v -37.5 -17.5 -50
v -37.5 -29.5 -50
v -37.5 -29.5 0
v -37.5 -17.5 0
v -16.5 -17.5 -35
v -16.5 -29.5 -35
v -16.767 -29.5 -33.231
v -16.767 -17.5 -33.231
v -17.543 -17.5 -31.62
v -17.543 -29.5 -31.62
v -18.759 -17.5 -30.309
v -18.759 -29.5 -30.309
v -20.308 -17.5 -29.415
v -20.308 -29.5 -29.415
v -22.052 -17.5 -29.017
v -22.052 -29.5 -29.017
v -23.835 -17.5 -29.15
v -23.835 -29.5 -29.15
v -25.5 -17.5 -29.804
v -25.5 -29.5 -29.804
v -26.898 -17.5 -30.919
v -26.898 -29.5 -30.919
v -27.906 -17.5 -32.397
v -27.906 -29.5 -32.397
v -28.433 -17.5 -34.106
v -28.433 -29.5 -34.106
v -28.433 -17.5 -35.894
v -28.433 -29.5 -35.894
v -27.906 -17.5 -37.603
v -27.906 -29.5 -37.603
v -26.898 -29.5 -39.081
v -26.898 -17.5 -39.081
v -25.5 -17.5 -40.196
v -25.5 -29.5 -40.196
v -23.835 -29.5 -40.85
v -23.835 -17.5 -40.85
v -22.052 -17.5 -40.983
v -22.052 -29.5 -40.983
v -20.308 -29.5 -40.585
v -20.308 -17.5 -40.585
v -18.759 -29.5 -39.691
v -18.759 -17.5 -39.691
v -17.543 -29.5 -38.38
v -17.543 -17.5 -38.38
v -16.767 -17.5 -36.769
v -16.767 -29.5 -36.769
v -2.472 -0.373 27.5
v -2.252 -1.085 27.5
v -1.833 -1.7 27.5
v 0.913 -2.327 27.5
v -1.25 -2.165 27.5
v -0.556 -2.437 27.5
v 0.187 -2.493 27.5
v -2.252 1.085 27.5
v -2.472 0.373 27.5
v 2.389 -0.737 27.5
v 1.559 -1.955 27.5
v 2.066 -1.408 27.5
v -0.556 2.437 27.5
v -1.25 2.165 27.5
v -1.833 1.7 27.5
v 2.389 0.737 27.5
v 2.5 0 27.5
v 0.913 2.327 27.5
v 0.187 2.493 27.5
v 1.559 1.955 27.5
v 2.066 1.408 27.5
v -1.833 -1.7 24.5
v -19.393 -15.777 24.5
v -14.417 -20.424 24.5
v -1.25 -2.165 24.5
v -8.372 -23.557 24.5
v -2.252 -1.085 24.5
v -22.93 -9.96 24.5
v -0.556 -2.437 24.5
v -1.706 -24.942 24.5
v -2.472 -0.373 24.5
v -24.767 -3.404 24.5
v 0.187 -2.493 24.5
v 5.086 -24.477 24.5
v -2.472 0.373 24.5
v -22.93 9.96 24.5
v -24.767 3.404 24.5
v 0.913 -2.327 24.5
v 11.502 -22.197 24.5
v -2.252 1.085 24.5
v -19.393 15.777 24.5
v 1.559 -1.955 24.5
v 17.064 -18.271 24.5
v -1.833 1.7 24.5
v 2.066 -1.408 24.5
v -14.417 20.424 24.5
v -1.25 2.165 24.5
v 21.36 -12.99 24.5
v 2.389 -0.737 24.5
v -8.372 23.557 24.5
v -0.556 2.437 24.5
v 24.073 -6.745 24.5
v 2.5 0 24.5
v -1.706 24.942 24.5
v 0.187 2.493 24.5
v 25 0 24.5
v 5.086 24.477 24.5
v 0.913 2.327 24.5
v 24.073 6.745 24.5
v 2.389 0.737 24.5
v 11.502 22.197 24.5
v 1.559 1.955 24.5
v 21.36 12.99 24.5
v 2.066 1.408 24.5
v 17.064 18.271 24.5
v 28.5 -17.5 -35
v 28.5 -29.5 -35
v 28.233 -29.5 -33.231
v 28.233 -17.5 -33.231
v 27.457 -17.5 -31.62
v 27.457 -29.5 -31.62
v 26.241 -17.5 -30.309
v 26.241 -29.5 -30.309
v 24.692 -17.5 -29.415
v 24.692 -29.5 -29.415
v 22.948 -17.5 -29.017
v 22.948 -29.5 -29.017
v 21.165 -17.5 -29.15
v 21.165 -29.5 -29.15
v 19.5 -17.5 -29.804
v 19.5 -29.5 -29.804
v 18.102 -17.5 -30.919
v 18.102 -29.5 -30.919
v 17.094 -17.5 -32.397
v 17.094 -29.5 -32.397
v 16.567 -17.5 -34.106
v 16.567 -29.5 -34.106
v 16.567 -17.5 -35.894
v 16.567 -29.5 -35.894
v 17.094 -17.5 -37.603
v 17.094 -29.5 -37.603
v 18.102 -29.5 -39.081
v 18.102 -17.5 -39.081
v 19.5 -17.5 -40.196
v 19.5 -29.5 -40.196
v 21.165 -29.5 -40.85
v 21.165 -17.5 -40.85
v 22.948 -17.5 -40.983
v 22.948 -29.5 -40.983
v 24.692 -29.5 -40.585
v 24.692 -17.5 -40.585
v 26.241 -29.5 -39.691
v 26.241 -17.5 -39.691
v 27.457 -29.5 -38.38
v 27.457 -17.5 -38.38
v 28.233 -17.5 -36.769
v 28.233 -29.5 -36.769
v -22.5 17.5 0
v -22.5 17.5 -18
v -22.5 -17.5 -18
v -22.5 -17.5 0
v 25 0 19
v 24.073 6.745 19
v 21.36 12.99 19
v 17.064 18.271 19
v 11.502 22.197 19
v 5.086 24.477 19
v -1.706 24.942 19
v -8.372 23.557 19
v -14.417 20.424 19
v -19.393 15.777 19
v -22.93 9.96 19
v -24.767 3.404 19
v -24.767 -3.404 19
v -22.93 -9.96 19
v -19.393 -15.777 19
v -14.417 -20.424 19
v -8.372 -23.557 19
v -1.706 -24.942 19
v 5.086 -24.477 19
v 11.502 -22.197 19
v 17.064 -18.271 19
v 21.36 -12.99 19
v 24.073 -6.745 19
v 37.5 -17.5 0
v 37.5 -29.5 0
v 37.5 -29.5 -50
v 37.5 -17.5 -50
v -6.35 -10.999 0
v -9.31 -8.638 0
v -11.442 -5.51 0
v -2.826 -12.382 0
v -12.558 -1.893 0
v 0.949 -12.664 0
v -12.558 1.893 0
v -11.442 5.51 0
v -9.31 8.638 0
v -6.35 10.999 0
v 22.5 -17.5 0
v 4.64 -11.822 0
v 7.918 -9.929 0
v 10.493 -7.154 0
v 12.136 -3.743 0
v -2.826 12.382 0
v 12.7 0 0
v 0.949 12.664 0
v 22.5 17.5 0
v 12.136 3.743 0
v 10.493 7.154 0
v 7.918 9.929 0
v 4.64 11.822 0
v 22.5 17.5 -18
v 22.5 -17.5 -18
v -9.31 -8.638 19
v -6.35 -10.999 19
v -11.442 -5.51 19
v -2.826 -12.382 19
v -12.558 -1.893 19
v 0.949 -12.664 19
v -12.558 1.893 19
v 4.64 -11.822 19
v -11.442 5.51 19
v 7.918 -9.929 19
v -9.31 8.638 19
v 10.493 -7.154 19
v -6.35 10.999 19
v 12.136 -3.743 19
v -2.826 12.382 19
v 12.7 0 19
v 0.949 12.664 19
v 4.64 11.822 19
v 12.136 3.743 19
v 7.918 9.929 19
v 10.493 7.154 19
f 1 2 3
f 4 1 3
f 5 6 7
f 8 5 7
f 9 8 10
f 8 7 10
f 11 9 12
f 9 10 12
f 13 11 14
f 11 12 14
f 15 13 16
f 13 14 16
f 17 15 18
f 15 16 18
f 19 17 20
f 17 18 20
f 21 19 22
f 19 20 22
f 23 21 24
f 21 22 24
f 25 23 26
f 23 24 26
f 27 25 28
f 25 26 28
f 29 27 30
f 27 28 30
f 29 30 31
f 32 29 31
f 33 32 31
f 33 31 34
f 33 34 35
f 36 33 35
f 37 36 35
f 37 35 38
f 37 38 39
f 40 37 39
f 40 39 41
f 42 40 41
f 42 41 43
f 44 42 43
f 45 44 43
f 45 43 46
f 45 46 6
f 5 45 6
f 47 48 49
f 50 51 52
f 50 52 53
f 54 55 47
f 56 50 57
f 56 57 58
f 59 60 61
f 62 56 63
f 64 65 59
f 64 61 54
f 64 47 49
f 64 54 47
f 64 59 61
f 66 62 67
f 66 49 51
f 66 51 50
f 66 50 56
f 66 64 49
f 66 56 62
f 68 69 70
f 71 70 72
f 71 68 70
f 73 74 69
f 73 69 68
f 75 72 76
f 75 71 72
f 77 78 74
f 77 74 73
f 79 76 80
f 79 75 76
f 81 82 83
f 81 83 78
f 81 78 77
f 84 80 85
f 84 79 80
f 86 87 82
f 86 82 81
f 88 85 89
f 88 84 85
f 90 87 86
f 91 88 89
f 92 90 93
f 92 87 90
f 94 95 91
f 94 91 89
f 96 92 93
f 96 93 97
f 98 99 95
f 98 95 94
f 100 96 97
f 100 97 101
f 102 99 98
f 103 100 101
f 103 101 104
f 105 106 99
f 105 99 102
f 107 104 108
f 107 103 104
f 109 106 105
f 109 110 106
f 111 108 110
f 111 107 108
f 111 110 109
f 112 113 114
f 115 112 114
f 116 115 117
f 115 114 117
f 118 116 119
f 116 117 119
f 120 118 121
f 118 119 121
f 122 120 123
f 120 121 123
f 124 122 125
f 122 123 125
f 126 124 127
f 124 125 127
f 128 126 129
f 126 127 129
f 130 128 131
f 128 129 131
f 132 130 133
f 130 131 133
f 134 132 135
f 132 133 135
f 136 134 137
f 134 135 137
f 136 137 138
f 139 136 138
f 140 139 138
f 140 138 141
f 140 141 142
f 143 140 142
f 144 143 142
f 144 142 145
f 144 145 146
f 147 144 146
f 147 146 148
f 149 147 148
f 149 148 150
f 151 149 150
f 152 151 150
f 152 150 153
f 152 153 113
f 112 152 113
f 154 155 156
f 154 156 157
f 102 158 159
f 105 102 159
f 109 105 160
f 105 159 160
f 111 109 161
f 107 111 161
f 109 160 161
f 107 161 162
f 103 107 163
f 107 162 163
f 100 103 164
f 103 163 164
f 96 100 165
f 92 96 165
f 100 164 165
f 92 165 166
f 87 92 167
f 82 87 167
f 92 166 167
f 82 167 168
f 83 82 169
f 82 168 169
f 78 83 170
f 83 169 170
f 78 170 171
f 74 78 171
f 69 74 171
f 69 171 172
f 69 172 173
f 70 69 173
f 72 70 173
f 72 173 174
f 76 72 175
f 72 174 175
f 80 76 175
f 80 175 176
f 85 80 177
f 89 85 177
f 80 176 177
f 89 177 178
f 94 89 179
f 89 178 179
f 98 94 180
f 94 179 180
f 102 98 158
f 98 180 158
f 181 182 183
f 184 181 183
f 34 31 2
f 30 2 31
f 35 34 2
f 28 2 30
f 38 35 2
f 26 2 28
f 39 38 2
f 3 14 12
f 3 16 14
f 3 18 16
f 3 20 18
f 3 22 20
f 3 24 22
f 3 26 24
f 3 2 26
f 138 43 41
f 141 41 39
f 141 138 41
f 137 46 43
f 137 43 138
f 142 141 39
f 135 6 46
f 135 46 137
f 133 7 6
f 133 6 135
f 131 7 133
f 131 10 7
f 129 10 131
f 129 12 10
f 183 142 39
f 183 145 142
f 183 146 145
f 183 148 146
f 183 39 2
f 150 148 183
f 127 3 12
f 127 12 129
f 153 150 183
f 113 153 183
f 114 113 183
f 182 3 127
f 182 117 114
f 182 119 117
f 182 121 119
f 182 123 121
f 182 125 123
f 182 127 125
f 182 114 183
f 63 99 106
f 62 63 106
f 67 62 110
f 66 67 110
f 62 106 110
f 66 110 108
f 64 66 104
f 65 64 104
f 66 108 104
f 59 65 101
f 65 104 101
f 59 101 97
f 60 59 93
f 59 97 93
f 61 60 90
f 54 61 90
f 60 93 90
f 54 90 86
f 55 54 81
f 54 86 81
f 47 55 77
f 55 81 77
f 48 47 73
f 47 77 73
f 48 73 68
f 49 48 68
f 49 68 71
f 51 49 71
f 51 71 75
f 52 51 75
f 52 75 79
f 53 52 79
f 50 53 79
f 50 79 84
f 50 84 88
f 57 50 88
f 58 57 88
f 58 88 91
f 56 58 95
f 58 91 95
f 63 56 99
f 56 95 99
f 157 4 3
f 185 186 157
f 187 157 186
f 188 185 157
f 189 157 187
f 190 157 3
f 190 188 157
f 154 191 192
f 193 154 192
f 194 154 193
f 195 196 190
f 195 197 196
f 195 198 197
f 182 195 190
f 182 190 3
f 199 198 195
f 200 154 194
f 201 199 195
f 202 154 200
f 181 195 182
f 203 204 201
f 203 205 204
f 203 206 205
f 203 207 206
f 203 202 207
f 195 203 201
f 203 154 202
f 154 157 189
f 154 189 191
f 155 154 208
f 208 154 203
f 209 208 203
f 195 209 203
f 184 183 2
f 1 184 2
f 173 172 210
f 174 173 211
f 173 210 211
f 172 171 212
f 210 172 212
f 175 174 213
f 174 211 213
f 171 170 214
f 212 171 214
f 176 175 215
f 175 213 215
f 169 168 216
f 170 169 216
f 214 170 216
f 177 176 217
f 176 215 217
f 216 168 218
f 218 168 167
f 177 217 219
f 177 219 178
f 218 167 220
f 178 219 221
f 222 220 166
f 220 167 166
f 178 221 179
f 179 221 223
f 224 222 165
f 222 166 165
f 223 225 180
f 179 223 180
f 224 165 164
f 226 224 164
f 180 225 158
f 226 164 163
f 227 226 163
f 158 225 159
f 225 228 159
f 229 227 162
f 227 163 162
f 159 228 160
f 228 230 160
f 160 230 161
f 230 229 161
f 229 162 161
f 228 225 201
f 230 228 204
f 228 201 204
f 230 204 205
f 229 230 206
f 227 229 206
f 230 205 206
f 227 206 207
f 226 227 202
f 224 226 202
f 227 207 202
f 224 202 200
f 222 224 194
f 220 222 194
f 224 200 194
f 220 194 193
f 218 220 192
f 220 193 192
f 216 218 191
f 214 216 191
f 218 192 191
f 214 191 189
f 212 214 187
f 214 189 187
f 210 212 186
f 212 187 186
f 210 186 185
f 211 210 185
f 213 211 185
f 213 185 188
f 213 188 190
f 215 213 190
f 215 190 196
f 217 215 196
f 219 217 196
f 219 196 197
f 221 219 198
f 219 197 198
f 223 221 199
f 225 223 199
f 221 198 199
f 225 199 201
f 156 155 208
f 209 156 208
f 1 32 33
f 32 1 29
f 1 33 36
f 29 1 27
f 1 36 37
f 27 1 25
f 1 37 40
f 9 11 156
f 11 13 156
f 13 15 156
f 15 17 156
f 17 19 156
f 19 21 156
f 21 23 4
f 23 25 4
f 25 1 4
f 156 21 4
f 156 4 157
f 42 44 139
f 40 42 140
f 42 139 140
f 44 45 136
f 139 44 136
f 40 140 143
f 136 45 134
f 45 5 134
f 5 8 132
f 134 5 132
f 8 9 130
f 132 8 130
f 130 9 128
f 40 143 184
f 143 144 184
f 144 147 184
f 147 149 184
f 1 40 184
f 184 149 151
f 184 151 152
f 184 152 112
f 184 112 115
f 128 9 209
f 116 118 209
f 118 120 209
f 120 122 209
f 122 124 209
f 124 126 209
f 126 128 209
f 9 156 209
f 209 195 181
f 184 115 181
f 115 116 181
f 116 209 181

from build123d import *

# Parameters (mm, degrees)
F0_W      = 100
F0_H      = 35
F1_DEPTH  = 18
F2_R      = 12.7
F3_DEPTH  = 19
F4_R      = 25
F4_R_2    = 12.7
F5_DEPTH  = 5.5
F6_R      = 2.5
F7_DEPTH  = 3
F8_W      = 100
F8_H      = 57
F8_H_2    = 18
F9_DEPTH  = 12
F11_DEPTH = 50
F13_D     = 12
F13_DEPTH = 12
F14_W     = 15
F14_H     = 18
F15_DEPTH = 35


with BuildPart() as f1:
    # F0 (on Top) → F1 (new body)
    with BuildSketch(Plane.XY):
        Rectangle(F0_W, F0_H)
    extrude(amount=-F1_DEPTH)

    # F2 (on face) → F3 (join)
    with BuildSketch(Plane.XY):
        Circle(F2_R)
    extrude(amount=F3_DEPTH)

    # F4 (on face) → F5 (join)
    with BuildSketch(Plane.XY.offset(19)):
        Circle(F4_R)
        Circle(F4_R_2, mode=Mode.SUBTRACT)
        Circle(F4_R_2)
    extrude(amount=F5_DEPTH)

    # F6 (on face) → F7 (join)
    with BuildSketch(Plane.XY.offset(24.5)):
        Circle(F6_R)
    extrude(amount=F7_DEPTH)

    # F8 (on face) → F9 (join)
    with BuildSketch(Plane.XZ.offset(17.5)):
        with Locations((0, -46.5)):
            Rectangle(F8_W, F8_H)
        with Locations((0, -9)):
            Rectangle(F8_W, F8_H_2)
    extrude(amount=F9_DEPTH)

    # F10 (on face) → F11 (cut)
    with BuildSketch(Plane.XZ.offset(29.5)):
        Polygon((-37.5, -50), (-37.5, 0), (-50, 0), (-50, -75), (50, -75), (50, 0), (37.5, 0), (37.5, -50), align=None)
    extrude(amount=-F11_DEPTH, mode=Mode.SUBTRACT)

    # F13
    with Locations(Plane(origin=(0, -17.5, 0), x_dir=(-1, 0, 0), z_dir=(0, 1, 0))):
        with Locations((-22.5, -35), (22.5, -35)):
            Hole(F13_D / 2, depth=F13_DEPTH)

    # F14 (on face) → F15 (cut)
    with BuildSketch(Plane(origin=(0, 17.5, 0), x_dir=(-1, 0, 0), z_dir=(0, 1, 0))):
        with Locations((-30, -9)):
            Rectangle(F14_W, F14_H)
        with Locations((30, -9)):
            Rectangle(F14_W, F14_H)
    extrude(amount=-F15_DEPTH, mode=Mode.SUBTRACT)


solid = f1.part
